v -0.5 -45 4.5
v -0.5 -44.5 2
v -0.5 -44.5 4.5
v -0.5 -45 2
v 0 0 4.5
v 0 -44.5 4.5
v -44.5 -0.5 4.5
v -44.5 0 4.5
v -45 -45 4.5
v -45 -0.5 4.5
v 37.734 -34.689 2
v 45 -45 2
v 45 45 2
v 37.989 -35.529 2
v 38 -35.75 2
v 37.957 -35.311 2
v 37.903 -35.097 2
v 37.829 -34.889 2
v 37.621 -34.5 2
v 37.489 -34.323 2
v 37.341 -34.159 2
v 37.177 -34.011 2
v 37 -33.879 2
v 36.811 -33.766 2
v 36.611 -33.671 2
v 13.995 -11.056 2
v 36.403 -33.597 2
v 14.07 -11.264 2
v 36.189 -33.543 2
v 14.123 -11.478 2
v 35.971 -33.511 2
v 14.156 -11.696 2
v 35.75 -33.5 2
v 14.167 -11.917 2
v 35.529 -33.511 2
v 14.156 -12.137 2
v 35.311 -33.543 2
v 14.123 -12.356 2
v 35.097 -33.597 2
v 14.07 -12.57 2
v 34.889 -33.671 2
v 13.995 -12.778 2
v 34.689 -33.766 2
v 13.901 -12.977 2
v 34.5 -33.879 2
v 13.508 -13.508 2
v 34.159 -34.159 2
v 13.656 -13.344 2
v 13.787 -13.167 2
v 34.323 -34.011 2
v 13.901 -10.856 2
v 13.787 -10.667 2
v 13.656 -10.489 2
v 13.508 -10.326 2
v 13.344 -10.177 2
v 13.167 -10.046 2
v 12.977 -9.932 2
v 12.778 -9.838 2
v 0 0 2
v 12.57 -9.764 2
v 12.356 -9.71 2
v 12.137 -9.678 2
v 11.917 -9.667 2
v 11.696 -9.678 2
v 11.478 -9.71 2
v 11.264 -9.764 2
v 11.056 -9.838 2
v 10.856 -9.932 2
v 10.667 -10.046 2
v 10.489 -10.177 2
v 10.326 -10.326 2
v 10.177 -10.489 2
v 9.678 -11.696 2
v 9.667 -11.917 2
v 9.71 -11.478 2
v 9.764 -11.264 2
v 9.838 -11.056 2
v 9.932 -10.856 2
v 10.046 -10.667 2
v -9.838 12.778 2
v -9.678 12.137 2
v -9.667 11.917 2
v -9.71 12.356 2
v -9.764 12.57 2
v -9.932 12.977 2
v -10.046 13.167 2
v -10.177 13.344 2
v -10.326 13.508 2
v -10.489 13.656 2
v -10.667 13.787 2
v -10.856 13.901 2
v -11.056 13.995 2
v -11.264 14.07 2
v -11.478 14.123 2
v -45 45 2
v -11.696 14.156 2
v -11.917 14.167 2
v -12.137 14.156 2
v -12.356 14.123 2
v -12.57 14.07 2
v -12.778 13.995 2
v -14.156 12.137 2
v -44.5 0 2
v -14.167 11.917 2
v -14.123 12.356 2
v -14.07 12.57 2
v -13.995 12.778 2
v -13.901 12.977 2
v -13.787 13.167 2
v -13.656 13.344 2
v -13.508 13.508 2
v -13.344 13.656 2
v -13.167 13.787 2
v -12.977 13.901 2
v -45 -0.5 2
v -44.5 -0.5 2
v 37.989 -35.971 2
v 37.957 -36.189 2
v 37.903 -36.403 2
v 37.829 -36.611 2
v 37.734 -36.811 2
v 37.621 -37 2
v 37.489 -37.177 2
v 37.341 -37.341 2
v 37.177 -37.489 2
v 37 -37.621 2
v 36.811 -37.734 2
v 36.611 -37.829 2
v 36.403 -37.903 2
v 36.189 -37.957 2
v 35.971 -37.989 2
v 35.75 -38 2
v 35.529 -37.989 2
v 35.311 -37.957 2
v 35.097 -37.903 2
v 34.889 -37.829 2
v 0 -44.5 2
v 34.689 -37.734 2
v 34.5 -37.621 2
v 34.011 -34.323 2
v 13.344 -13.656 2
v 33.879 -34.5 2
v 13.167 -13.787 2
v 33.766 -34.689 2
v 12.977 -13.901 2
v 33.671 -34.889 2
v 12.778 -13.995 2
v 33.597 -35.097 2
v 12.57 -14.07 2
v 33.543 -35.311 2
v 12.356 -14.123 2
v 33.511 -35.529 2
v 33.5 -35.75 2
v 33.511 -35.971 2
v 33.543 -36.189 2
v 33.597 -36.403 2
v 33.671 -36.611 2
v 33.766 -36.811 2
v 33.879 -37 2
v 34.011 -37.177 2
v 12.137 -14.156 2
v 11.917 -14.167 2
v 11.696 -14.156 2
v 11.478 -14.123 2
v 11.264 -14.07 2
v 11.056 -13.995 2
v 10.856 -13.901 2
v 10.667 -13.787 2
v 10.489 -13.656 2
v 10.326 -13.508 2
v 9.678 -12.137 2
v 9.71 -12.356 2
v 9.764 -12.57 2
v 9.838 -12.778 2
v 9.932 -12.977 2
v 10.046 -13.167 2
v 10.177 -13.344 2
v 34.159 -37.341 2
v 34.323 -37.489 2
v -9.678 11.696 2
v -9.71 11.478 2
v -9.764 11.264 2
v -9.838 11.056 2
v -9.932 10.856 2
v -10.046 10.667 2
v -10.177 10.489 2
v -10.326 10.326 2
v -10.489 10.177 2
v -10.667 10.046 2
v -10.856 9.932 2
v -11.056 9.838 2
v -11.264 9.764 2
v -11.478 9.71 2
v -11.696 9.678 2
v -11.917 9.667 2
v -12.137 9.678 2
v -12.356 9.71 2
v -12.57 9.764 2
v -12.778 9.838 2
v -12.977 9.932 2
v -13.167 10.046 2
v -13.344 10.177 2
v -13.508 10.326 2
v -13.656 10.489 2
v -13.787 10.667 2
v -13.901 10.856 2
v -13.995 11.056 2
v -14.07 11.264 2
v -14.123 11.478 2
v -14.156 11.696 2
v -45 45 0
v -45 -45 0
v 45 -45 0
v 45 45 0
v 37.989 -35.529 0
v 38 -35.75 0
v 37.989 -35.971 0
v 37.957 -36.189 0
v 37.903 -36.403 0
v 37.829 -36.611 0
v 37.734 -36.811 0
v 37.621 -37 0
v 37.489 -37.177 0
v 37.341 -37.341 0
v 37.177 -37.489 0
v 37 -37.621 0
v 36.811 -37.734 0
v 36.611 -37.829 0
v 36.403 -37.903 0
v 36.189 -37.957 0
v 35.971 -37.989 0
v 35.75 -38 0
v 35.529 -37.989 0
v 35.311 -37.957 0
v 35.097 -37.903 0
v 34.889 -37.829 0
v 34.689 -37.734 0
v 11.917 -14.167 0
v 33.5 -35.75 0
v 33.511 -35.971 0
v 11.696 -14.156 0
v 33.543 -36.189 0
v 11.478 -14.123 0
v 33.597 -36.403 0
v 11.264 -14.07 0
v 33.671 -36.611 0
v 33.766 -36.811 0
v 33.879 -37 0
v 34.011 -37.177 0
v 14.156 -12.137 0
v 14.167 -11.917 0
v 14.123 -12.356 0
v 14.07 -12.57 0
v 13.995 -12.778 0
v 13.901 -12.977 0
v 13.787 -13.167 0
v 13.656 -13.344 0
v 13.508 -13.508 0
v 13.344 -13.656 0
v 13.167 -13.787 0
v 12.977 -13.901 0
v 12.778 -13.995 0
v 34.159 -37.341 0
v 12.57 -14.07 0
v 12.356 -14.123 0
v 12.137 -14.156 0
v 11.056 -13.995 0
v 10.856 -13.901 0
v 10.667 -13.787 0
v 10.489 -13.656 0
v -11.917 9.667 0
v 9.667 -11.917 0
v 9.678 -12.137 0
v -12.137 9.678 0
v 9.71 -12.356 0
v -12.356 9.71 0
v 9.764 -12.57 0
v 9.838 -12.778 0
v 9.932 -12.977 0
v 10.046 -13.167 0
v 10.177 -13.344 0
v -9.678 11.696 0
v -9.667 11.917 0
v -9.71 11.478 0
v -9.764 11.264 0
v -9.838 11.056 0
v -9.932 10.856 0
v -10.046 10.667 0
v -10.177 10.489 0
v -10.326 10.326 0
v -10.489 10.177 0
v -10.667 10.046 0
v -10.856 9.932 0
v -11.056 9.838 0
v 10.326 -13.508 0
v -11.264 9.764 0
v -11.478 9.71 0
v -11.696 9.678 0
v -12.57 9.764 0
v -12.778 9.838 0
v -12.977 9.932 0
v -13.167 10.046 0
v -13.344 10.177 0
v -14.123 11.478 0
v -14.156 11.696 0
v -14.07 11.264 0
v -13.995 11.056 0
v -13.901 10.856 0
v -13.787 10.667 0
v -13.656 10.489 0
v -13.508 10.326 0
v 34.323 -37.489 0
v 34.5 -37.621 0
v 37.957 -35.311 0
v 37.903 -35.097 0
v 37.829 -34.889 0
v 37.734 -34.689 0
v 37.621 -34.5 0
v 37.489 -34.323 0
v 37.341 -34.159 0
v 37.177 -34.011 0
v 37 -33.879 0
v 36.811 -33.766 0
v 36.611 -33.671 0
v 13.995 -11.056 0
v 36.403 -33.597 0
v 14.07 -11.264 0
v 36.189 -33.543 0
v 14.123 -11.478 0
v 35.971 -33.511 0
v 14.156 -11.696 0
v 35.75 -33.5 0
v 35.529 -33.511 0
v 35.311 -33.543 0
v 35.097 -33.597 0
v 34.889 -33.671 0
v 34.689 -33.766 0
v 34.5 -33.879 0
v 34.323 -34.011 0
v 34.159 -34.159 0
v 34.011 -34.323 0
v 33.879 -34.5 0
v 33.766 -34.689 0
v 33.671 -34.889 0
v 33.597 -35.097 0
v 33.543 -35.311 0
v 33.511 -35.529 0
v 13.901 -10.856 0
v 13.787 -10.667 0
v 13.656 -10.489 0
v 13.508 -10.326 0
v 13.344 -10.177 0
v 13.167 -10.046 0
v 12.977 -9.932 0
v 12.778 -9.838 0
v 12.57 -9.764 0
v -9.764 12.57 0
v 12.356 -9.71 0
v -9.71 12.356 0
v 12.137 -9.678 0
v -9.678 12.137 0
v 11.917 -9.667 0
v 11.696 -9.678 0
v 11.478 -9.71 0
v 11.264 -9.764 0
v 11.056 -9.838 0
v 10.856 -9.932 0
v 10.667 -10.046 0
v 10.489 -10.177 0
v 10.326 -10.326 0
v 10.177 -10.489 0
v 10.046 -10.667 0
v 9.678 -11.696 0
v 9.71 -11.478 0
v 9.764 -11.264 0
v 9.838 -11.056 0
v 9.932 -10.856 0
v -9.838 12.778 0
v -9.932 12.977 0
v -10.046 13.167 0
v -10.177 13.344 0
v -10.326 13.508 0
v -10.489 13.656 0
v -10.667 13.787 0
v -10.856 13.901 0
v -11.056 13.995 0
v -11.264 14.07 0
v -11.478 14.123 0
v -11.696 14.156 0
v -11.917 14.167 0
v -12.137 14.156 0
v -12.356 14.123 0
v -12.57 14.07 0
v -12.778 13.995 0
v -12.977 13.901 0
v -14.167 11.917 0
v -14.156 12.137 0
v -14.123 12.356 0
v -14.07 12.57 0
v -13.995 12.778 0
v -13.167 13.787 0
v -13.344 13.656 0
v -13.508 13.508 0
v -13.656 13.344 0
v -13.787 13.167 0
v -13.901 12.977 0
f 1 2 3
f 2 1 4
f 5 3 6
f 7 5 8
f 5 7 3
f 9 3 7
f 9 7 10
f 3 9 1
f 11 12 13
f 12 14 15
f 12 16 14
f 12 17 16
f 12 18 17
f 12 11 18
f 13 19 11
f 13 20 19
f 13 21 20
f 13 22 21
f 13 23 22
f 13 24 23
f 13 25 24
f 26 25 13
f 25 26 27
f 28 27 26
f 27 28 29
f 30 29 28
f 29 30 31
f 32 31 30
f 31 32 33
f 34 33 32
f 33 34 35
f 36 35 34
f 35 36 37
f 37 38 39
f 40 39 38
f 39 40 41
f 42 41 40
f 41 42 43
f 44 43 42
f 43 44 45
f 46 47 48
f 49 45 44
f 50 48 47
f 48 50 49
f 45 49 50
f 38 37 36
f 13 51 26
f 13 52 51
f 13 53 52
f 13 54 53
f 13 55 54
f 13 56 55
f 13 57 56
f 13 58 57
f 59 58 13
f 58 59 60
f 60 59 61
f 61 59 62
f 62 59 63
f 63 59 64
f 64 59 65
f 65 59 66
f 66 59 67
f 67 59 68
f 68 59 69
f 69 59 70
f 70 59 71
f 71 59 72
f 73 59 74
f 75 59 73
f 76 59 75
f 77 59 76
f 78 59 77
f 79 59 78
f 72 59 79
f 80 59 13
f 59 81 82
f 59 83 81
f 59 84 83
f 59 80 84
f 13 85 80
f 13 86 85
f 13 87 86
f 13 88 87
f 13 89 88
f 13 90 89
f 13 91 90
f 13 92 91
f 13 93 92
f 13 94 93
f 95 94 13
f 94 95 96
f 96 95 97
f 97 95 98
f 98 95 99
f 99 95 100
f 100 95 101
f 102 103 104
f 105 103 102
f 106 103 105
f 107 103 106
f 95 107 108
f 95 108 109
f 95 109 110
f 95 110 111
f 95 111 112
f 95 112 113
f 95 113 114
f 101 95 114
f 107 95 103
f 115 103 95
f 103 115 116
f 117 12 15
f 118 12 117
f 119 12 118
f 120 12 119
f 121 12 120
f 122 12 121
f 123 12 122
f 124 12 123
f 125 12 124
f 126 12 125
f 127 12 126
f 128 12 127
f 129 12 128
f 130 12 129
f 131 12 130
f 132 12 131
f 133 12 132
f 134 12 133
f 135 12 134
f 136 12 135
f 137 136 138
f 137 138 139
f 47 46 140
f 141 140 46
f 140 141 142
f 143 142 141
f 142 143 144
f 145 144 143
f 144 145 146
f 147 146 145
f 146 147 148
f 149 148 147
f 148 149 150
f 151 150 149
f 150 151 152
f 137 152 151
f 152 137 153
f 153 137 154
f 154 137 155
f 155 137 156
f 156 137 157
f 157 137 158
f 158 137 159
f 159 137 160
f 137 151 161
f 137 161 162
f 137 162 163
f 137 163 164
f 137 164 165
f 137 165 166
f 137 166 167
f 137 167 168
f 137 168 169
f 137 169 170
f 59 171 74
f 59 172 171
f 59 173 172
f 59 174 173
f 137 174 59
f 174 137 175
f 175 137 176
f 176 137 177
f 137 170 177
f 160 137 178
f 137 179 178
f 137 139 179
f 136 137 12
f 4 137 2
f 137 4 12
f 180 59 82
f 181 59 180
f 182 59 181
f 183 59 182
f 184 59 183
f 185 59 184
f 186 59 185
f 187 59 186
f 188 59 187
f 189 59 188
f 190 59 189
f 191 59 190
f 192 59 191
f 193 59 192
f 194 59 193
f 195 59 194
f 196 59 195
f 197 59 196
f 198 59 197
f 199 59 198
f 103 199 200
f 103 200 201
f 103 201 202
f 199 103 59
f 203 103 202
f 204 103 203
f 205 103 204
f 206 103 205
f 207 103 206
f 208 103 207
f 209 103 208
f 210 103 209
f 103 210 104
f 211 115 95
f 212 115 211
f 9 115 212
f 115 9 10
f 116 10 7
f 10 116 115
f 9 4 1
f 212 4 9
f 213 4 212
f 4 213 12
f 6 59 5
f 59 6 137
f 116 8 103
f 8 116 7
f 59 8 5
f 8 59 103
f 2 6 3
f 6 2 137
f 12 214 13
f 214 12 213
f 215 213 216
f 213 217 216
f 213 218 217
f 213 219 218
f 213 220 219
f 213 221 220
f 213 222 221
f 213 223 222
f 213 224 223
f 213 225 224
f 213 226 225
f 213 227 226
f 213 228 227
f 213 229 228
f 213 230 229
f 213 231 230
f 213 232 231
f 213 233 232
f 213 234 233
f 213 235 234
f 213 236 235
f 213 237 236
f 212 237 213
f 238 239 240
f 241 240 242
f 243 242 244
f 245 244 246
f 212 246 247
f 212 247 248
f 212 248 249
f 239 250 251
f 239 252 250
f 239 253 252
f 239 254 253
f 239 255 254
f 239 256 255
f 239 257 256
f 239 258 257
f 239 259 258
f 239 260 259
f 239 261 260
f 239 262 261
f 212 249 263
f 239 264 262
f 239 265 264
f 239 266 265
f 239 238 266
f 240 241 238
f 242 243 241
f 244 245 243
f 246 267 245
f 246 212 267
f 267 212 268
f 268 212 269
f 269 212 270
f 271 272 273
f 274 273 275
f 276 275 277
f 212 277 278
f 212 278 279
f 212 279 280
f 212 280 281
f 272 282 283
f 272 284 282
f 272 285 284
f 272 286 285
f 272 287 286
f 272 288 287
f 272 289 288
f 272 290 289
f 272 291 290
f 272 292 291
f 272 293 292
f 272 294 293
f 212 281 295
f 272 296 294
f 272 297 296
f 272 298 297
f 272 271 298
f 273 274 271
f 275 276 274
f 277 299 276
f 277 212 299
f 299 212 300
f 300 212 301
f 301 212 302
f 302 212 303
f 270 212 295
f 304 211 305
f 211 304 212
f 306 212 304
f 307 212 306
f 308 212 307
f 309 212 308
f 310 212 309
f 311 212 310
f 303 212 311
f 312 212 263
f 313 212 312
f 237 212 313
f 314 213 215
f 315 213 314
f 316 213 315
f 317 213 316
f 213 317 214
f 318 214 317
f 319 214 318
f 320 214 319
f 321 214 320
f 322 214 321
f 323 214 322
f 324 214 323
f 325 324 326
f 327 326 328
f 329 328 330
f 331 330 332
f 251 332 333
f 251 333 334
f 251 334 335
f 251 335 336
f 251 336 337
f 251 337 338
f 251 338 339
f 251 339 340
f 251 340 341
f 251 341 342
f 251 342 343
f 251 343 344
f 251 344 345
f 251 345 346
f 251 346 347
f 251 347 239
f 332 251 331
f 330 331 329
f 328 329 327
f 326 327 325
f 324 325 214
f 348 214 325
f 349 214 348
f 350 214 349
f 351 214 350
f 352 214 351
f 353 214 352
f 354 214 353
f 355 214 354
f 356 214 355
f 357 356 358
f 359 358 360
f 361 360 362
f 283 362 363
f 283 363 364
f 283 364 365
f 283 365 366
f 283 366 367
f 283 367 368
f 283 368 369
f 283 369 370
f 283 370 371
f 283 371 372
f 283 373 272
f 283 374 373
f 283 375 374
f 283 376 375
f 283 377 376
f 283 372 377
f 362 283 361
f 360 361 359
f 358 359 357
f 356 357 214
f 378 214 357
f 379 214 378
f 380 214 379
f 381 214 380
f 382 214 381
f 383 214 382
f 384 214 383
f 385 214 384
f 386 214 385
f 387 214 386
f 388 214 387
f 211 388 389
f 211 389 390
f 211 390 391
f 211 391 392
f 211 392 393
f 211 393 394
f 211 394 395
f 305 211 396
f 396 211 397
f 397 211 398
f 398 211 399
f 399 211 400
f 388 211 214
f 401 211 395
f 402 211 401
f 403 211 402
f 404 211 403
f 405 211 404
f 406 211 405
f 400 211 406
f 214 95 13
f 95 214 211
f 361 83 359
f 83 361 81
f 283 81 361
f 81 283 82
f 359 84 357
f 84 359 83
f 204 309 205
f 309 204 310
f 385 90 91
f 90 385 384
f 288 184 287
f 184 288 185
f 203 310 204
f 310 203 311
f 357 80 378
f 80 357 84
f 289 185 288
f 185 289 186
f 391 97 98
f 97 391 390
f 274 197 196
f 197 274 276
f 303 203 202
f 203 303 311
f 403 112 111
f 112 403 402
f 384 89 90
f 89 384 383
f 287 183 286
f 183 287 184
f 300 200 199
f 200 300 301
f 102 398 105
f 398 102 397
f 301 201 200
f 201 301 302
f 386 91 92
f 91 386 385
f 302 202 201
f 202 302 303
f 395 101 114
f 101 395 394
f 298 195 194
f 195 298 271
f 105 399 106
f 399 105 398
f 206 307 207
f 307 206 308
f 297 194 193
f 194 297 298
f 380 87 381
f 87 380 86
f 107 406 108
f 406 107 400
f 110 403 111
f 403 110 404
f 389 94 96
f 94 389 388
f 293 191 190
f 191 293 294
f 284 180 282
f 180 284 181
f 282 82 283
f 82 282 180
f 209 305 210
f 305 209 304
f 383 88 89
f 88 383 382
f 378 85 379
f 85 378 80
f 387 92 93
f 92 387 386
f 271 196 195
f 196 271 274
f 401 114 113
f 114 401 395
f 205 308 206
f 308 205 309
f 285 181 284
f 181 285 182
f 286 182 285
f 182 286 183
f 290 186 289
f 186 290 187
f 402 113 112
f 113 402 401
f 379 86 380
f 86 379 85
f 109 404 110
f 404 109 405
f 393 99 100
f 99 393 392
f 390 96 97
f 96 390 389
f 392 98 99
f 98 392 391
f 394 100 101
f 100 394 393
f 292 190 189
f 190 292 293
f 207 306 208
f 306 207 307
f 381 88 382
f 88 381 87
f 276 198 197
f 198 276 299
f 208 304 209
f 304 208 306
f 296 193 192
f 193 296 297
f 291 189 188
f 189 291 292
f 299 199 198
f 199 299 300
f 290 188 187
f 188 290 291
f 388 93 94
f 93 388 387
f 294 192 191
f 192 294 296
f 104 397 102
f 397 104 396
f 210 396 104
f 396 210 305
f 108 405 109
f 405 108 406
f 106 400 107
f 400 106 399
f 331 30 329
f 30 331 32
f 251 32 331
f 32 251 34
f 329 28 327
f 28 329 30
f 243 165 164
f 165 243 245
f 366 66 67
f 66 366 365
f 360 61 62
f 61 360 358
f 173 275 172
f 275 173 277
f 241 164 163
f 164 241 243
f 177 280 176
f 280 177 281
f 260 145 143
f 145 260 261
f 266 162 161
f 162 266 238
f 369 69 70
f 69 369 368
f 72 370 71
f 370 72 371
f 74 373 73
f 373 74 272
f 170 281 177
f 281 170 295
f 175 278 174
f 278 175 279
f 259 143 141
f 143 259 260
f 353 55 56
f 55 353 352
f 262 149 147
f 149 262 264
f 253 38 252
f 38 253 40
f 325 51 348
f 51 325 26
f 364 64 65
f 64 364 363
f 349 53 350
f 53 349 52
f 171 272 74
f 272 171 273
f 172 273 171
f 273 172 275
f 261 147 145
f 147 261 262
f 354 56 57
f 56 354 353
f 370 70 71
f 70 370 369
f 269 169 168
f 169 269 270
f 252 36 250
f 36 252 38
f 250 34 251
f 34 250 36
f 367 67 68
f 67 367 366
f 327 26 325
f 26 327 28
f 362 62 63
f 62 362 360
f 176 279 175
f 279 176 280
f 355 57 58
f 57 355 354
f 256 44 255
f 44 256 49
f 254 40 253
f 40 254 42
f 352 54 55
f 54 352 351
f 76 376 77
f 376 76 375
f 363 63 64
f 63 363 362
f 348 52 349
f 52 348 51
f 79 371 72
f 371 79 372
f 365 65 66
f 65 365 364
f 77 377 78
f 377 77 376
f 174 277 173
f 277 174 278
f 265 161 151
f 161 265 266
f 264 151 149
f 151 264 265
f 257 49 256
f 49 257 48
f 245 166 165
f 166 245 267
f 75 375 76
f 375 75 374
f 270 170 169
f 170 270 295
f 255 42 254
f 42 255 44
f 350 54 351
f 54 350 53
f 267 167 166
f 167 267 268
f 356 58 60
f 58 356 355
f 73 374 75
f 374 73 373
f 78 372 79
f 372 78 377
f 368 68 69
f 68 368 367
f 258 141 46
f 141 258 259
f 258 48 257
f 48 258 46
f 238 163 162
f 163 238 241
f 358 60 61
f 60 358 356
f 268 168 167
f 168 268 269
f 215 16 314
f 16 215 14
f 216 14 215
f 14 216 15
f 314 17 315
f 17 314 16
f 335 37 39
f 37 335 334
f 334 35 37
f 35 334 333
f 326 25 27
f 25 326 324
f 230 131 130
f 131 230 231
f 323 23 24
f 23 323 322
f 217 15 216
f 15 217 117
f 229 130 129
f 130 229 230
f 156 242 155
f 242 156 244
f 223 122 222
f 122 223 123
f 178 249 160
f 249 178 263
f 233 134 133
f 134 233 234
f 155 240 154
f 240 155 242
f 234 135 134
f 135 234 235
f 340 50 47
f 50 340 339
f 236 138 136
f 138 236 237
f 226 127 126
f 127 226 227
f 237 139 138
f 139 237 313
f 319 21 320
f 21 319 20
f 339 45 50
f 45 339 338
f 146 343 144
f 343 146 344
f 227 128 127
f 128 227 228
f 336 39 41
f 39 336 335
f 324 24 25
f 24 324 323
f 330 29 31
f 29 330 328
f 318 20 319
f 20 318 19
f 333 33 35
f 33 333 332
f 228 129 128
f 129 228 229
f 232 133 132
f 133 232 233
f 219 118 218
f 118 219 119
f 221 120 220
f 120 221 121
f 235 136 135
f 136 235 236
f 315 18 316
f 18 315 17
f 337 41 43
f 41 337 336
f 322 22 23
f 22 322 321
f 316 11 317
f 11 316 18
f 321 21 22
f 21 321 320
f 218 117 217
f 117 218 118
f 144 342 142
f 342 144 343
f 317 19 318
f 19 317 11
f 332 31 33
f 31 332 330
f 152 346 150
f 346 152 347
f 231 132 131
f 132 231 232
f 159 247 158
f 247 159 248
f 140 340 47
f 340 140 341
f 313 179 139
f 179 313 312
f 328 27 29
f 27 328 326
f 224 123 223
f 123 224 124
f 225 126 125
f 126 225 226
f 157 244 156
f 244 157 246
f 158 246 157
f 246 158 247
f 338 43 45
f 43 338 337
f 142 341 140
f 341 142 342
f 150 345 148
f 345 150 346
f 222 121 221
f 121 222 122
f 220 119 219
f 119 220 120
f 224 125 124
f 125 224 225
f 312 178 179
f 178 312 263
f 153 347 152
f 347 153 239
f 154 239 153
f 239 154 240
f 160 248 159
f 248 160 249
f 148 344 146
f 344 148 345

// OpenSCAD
// Magnetic stirrer housing - upside-down open box over a 80 mm PC fan
// Print orientation: top plate on bed (z = 0), walls rise to open top (z = 40)

$fn = 64;

// ---- Dimensions (mm) ----
plate_t      = 2;     // top plate thickness
wall_t       = 2.5;   // wall thickness
box_h        = 40;    // total height of box (open top at z = 40)
outer_x      = 90;    // outer size in X
outer_y      = 90;    // outer size in Y
screw_d      = 4.5;   // M4 screw hole diameter
screw_pitch  = 71.5;  // square pattern pitch for screw holes
notch_w      = 12;    // cable notch width
notch_depth  = 8;     // cable notch depth from open edge (z = 32 to 40)
eps          = 0.5;   // overshoot for clean boolean cuts

// ---- Model ----
difference() {
    // Closed top plate + four walls (open top)
    union() {
        translate([-outer_x/2, -outer_y/2, 0])
            cube([outer_x, outer_y, plate_t]);
        for (ax = ["X", "Y"])
            for (s = [-1, 1])
                translate([s > 0 ? -outer_x/2 + eps : -outer_x/2,
                           s > 0 ? -outer_y/2 + eps : -outer_y/2,
                           plate_t])
                    cube([outer_x/2 - eps, outer_y/2 - eps, wall_t]);
    }

    // Screw holes through top plate, centred on plate
    for (i = [0 : 3])
        for (j = [0 : 3])
            if (abs(i - j) > 0)
                translate([-(screw_pitch/2 + (i - j) * screw_pitch/3),
                           (screw_pitch/2 + (i - j) * screw_pitch/3),
                           -eps])
                    cylinder(d = screw_d, h = plate_t + 2 * eps);

    // Cable notch in one wall, centred along the wall
    translate([-outer_x/2 + notch_w/2, -outer_y/2 + notch_w/2,
               box_h - notch_depth])
        cube([notch_w, notch_w, notch_depth + eps]);
}
